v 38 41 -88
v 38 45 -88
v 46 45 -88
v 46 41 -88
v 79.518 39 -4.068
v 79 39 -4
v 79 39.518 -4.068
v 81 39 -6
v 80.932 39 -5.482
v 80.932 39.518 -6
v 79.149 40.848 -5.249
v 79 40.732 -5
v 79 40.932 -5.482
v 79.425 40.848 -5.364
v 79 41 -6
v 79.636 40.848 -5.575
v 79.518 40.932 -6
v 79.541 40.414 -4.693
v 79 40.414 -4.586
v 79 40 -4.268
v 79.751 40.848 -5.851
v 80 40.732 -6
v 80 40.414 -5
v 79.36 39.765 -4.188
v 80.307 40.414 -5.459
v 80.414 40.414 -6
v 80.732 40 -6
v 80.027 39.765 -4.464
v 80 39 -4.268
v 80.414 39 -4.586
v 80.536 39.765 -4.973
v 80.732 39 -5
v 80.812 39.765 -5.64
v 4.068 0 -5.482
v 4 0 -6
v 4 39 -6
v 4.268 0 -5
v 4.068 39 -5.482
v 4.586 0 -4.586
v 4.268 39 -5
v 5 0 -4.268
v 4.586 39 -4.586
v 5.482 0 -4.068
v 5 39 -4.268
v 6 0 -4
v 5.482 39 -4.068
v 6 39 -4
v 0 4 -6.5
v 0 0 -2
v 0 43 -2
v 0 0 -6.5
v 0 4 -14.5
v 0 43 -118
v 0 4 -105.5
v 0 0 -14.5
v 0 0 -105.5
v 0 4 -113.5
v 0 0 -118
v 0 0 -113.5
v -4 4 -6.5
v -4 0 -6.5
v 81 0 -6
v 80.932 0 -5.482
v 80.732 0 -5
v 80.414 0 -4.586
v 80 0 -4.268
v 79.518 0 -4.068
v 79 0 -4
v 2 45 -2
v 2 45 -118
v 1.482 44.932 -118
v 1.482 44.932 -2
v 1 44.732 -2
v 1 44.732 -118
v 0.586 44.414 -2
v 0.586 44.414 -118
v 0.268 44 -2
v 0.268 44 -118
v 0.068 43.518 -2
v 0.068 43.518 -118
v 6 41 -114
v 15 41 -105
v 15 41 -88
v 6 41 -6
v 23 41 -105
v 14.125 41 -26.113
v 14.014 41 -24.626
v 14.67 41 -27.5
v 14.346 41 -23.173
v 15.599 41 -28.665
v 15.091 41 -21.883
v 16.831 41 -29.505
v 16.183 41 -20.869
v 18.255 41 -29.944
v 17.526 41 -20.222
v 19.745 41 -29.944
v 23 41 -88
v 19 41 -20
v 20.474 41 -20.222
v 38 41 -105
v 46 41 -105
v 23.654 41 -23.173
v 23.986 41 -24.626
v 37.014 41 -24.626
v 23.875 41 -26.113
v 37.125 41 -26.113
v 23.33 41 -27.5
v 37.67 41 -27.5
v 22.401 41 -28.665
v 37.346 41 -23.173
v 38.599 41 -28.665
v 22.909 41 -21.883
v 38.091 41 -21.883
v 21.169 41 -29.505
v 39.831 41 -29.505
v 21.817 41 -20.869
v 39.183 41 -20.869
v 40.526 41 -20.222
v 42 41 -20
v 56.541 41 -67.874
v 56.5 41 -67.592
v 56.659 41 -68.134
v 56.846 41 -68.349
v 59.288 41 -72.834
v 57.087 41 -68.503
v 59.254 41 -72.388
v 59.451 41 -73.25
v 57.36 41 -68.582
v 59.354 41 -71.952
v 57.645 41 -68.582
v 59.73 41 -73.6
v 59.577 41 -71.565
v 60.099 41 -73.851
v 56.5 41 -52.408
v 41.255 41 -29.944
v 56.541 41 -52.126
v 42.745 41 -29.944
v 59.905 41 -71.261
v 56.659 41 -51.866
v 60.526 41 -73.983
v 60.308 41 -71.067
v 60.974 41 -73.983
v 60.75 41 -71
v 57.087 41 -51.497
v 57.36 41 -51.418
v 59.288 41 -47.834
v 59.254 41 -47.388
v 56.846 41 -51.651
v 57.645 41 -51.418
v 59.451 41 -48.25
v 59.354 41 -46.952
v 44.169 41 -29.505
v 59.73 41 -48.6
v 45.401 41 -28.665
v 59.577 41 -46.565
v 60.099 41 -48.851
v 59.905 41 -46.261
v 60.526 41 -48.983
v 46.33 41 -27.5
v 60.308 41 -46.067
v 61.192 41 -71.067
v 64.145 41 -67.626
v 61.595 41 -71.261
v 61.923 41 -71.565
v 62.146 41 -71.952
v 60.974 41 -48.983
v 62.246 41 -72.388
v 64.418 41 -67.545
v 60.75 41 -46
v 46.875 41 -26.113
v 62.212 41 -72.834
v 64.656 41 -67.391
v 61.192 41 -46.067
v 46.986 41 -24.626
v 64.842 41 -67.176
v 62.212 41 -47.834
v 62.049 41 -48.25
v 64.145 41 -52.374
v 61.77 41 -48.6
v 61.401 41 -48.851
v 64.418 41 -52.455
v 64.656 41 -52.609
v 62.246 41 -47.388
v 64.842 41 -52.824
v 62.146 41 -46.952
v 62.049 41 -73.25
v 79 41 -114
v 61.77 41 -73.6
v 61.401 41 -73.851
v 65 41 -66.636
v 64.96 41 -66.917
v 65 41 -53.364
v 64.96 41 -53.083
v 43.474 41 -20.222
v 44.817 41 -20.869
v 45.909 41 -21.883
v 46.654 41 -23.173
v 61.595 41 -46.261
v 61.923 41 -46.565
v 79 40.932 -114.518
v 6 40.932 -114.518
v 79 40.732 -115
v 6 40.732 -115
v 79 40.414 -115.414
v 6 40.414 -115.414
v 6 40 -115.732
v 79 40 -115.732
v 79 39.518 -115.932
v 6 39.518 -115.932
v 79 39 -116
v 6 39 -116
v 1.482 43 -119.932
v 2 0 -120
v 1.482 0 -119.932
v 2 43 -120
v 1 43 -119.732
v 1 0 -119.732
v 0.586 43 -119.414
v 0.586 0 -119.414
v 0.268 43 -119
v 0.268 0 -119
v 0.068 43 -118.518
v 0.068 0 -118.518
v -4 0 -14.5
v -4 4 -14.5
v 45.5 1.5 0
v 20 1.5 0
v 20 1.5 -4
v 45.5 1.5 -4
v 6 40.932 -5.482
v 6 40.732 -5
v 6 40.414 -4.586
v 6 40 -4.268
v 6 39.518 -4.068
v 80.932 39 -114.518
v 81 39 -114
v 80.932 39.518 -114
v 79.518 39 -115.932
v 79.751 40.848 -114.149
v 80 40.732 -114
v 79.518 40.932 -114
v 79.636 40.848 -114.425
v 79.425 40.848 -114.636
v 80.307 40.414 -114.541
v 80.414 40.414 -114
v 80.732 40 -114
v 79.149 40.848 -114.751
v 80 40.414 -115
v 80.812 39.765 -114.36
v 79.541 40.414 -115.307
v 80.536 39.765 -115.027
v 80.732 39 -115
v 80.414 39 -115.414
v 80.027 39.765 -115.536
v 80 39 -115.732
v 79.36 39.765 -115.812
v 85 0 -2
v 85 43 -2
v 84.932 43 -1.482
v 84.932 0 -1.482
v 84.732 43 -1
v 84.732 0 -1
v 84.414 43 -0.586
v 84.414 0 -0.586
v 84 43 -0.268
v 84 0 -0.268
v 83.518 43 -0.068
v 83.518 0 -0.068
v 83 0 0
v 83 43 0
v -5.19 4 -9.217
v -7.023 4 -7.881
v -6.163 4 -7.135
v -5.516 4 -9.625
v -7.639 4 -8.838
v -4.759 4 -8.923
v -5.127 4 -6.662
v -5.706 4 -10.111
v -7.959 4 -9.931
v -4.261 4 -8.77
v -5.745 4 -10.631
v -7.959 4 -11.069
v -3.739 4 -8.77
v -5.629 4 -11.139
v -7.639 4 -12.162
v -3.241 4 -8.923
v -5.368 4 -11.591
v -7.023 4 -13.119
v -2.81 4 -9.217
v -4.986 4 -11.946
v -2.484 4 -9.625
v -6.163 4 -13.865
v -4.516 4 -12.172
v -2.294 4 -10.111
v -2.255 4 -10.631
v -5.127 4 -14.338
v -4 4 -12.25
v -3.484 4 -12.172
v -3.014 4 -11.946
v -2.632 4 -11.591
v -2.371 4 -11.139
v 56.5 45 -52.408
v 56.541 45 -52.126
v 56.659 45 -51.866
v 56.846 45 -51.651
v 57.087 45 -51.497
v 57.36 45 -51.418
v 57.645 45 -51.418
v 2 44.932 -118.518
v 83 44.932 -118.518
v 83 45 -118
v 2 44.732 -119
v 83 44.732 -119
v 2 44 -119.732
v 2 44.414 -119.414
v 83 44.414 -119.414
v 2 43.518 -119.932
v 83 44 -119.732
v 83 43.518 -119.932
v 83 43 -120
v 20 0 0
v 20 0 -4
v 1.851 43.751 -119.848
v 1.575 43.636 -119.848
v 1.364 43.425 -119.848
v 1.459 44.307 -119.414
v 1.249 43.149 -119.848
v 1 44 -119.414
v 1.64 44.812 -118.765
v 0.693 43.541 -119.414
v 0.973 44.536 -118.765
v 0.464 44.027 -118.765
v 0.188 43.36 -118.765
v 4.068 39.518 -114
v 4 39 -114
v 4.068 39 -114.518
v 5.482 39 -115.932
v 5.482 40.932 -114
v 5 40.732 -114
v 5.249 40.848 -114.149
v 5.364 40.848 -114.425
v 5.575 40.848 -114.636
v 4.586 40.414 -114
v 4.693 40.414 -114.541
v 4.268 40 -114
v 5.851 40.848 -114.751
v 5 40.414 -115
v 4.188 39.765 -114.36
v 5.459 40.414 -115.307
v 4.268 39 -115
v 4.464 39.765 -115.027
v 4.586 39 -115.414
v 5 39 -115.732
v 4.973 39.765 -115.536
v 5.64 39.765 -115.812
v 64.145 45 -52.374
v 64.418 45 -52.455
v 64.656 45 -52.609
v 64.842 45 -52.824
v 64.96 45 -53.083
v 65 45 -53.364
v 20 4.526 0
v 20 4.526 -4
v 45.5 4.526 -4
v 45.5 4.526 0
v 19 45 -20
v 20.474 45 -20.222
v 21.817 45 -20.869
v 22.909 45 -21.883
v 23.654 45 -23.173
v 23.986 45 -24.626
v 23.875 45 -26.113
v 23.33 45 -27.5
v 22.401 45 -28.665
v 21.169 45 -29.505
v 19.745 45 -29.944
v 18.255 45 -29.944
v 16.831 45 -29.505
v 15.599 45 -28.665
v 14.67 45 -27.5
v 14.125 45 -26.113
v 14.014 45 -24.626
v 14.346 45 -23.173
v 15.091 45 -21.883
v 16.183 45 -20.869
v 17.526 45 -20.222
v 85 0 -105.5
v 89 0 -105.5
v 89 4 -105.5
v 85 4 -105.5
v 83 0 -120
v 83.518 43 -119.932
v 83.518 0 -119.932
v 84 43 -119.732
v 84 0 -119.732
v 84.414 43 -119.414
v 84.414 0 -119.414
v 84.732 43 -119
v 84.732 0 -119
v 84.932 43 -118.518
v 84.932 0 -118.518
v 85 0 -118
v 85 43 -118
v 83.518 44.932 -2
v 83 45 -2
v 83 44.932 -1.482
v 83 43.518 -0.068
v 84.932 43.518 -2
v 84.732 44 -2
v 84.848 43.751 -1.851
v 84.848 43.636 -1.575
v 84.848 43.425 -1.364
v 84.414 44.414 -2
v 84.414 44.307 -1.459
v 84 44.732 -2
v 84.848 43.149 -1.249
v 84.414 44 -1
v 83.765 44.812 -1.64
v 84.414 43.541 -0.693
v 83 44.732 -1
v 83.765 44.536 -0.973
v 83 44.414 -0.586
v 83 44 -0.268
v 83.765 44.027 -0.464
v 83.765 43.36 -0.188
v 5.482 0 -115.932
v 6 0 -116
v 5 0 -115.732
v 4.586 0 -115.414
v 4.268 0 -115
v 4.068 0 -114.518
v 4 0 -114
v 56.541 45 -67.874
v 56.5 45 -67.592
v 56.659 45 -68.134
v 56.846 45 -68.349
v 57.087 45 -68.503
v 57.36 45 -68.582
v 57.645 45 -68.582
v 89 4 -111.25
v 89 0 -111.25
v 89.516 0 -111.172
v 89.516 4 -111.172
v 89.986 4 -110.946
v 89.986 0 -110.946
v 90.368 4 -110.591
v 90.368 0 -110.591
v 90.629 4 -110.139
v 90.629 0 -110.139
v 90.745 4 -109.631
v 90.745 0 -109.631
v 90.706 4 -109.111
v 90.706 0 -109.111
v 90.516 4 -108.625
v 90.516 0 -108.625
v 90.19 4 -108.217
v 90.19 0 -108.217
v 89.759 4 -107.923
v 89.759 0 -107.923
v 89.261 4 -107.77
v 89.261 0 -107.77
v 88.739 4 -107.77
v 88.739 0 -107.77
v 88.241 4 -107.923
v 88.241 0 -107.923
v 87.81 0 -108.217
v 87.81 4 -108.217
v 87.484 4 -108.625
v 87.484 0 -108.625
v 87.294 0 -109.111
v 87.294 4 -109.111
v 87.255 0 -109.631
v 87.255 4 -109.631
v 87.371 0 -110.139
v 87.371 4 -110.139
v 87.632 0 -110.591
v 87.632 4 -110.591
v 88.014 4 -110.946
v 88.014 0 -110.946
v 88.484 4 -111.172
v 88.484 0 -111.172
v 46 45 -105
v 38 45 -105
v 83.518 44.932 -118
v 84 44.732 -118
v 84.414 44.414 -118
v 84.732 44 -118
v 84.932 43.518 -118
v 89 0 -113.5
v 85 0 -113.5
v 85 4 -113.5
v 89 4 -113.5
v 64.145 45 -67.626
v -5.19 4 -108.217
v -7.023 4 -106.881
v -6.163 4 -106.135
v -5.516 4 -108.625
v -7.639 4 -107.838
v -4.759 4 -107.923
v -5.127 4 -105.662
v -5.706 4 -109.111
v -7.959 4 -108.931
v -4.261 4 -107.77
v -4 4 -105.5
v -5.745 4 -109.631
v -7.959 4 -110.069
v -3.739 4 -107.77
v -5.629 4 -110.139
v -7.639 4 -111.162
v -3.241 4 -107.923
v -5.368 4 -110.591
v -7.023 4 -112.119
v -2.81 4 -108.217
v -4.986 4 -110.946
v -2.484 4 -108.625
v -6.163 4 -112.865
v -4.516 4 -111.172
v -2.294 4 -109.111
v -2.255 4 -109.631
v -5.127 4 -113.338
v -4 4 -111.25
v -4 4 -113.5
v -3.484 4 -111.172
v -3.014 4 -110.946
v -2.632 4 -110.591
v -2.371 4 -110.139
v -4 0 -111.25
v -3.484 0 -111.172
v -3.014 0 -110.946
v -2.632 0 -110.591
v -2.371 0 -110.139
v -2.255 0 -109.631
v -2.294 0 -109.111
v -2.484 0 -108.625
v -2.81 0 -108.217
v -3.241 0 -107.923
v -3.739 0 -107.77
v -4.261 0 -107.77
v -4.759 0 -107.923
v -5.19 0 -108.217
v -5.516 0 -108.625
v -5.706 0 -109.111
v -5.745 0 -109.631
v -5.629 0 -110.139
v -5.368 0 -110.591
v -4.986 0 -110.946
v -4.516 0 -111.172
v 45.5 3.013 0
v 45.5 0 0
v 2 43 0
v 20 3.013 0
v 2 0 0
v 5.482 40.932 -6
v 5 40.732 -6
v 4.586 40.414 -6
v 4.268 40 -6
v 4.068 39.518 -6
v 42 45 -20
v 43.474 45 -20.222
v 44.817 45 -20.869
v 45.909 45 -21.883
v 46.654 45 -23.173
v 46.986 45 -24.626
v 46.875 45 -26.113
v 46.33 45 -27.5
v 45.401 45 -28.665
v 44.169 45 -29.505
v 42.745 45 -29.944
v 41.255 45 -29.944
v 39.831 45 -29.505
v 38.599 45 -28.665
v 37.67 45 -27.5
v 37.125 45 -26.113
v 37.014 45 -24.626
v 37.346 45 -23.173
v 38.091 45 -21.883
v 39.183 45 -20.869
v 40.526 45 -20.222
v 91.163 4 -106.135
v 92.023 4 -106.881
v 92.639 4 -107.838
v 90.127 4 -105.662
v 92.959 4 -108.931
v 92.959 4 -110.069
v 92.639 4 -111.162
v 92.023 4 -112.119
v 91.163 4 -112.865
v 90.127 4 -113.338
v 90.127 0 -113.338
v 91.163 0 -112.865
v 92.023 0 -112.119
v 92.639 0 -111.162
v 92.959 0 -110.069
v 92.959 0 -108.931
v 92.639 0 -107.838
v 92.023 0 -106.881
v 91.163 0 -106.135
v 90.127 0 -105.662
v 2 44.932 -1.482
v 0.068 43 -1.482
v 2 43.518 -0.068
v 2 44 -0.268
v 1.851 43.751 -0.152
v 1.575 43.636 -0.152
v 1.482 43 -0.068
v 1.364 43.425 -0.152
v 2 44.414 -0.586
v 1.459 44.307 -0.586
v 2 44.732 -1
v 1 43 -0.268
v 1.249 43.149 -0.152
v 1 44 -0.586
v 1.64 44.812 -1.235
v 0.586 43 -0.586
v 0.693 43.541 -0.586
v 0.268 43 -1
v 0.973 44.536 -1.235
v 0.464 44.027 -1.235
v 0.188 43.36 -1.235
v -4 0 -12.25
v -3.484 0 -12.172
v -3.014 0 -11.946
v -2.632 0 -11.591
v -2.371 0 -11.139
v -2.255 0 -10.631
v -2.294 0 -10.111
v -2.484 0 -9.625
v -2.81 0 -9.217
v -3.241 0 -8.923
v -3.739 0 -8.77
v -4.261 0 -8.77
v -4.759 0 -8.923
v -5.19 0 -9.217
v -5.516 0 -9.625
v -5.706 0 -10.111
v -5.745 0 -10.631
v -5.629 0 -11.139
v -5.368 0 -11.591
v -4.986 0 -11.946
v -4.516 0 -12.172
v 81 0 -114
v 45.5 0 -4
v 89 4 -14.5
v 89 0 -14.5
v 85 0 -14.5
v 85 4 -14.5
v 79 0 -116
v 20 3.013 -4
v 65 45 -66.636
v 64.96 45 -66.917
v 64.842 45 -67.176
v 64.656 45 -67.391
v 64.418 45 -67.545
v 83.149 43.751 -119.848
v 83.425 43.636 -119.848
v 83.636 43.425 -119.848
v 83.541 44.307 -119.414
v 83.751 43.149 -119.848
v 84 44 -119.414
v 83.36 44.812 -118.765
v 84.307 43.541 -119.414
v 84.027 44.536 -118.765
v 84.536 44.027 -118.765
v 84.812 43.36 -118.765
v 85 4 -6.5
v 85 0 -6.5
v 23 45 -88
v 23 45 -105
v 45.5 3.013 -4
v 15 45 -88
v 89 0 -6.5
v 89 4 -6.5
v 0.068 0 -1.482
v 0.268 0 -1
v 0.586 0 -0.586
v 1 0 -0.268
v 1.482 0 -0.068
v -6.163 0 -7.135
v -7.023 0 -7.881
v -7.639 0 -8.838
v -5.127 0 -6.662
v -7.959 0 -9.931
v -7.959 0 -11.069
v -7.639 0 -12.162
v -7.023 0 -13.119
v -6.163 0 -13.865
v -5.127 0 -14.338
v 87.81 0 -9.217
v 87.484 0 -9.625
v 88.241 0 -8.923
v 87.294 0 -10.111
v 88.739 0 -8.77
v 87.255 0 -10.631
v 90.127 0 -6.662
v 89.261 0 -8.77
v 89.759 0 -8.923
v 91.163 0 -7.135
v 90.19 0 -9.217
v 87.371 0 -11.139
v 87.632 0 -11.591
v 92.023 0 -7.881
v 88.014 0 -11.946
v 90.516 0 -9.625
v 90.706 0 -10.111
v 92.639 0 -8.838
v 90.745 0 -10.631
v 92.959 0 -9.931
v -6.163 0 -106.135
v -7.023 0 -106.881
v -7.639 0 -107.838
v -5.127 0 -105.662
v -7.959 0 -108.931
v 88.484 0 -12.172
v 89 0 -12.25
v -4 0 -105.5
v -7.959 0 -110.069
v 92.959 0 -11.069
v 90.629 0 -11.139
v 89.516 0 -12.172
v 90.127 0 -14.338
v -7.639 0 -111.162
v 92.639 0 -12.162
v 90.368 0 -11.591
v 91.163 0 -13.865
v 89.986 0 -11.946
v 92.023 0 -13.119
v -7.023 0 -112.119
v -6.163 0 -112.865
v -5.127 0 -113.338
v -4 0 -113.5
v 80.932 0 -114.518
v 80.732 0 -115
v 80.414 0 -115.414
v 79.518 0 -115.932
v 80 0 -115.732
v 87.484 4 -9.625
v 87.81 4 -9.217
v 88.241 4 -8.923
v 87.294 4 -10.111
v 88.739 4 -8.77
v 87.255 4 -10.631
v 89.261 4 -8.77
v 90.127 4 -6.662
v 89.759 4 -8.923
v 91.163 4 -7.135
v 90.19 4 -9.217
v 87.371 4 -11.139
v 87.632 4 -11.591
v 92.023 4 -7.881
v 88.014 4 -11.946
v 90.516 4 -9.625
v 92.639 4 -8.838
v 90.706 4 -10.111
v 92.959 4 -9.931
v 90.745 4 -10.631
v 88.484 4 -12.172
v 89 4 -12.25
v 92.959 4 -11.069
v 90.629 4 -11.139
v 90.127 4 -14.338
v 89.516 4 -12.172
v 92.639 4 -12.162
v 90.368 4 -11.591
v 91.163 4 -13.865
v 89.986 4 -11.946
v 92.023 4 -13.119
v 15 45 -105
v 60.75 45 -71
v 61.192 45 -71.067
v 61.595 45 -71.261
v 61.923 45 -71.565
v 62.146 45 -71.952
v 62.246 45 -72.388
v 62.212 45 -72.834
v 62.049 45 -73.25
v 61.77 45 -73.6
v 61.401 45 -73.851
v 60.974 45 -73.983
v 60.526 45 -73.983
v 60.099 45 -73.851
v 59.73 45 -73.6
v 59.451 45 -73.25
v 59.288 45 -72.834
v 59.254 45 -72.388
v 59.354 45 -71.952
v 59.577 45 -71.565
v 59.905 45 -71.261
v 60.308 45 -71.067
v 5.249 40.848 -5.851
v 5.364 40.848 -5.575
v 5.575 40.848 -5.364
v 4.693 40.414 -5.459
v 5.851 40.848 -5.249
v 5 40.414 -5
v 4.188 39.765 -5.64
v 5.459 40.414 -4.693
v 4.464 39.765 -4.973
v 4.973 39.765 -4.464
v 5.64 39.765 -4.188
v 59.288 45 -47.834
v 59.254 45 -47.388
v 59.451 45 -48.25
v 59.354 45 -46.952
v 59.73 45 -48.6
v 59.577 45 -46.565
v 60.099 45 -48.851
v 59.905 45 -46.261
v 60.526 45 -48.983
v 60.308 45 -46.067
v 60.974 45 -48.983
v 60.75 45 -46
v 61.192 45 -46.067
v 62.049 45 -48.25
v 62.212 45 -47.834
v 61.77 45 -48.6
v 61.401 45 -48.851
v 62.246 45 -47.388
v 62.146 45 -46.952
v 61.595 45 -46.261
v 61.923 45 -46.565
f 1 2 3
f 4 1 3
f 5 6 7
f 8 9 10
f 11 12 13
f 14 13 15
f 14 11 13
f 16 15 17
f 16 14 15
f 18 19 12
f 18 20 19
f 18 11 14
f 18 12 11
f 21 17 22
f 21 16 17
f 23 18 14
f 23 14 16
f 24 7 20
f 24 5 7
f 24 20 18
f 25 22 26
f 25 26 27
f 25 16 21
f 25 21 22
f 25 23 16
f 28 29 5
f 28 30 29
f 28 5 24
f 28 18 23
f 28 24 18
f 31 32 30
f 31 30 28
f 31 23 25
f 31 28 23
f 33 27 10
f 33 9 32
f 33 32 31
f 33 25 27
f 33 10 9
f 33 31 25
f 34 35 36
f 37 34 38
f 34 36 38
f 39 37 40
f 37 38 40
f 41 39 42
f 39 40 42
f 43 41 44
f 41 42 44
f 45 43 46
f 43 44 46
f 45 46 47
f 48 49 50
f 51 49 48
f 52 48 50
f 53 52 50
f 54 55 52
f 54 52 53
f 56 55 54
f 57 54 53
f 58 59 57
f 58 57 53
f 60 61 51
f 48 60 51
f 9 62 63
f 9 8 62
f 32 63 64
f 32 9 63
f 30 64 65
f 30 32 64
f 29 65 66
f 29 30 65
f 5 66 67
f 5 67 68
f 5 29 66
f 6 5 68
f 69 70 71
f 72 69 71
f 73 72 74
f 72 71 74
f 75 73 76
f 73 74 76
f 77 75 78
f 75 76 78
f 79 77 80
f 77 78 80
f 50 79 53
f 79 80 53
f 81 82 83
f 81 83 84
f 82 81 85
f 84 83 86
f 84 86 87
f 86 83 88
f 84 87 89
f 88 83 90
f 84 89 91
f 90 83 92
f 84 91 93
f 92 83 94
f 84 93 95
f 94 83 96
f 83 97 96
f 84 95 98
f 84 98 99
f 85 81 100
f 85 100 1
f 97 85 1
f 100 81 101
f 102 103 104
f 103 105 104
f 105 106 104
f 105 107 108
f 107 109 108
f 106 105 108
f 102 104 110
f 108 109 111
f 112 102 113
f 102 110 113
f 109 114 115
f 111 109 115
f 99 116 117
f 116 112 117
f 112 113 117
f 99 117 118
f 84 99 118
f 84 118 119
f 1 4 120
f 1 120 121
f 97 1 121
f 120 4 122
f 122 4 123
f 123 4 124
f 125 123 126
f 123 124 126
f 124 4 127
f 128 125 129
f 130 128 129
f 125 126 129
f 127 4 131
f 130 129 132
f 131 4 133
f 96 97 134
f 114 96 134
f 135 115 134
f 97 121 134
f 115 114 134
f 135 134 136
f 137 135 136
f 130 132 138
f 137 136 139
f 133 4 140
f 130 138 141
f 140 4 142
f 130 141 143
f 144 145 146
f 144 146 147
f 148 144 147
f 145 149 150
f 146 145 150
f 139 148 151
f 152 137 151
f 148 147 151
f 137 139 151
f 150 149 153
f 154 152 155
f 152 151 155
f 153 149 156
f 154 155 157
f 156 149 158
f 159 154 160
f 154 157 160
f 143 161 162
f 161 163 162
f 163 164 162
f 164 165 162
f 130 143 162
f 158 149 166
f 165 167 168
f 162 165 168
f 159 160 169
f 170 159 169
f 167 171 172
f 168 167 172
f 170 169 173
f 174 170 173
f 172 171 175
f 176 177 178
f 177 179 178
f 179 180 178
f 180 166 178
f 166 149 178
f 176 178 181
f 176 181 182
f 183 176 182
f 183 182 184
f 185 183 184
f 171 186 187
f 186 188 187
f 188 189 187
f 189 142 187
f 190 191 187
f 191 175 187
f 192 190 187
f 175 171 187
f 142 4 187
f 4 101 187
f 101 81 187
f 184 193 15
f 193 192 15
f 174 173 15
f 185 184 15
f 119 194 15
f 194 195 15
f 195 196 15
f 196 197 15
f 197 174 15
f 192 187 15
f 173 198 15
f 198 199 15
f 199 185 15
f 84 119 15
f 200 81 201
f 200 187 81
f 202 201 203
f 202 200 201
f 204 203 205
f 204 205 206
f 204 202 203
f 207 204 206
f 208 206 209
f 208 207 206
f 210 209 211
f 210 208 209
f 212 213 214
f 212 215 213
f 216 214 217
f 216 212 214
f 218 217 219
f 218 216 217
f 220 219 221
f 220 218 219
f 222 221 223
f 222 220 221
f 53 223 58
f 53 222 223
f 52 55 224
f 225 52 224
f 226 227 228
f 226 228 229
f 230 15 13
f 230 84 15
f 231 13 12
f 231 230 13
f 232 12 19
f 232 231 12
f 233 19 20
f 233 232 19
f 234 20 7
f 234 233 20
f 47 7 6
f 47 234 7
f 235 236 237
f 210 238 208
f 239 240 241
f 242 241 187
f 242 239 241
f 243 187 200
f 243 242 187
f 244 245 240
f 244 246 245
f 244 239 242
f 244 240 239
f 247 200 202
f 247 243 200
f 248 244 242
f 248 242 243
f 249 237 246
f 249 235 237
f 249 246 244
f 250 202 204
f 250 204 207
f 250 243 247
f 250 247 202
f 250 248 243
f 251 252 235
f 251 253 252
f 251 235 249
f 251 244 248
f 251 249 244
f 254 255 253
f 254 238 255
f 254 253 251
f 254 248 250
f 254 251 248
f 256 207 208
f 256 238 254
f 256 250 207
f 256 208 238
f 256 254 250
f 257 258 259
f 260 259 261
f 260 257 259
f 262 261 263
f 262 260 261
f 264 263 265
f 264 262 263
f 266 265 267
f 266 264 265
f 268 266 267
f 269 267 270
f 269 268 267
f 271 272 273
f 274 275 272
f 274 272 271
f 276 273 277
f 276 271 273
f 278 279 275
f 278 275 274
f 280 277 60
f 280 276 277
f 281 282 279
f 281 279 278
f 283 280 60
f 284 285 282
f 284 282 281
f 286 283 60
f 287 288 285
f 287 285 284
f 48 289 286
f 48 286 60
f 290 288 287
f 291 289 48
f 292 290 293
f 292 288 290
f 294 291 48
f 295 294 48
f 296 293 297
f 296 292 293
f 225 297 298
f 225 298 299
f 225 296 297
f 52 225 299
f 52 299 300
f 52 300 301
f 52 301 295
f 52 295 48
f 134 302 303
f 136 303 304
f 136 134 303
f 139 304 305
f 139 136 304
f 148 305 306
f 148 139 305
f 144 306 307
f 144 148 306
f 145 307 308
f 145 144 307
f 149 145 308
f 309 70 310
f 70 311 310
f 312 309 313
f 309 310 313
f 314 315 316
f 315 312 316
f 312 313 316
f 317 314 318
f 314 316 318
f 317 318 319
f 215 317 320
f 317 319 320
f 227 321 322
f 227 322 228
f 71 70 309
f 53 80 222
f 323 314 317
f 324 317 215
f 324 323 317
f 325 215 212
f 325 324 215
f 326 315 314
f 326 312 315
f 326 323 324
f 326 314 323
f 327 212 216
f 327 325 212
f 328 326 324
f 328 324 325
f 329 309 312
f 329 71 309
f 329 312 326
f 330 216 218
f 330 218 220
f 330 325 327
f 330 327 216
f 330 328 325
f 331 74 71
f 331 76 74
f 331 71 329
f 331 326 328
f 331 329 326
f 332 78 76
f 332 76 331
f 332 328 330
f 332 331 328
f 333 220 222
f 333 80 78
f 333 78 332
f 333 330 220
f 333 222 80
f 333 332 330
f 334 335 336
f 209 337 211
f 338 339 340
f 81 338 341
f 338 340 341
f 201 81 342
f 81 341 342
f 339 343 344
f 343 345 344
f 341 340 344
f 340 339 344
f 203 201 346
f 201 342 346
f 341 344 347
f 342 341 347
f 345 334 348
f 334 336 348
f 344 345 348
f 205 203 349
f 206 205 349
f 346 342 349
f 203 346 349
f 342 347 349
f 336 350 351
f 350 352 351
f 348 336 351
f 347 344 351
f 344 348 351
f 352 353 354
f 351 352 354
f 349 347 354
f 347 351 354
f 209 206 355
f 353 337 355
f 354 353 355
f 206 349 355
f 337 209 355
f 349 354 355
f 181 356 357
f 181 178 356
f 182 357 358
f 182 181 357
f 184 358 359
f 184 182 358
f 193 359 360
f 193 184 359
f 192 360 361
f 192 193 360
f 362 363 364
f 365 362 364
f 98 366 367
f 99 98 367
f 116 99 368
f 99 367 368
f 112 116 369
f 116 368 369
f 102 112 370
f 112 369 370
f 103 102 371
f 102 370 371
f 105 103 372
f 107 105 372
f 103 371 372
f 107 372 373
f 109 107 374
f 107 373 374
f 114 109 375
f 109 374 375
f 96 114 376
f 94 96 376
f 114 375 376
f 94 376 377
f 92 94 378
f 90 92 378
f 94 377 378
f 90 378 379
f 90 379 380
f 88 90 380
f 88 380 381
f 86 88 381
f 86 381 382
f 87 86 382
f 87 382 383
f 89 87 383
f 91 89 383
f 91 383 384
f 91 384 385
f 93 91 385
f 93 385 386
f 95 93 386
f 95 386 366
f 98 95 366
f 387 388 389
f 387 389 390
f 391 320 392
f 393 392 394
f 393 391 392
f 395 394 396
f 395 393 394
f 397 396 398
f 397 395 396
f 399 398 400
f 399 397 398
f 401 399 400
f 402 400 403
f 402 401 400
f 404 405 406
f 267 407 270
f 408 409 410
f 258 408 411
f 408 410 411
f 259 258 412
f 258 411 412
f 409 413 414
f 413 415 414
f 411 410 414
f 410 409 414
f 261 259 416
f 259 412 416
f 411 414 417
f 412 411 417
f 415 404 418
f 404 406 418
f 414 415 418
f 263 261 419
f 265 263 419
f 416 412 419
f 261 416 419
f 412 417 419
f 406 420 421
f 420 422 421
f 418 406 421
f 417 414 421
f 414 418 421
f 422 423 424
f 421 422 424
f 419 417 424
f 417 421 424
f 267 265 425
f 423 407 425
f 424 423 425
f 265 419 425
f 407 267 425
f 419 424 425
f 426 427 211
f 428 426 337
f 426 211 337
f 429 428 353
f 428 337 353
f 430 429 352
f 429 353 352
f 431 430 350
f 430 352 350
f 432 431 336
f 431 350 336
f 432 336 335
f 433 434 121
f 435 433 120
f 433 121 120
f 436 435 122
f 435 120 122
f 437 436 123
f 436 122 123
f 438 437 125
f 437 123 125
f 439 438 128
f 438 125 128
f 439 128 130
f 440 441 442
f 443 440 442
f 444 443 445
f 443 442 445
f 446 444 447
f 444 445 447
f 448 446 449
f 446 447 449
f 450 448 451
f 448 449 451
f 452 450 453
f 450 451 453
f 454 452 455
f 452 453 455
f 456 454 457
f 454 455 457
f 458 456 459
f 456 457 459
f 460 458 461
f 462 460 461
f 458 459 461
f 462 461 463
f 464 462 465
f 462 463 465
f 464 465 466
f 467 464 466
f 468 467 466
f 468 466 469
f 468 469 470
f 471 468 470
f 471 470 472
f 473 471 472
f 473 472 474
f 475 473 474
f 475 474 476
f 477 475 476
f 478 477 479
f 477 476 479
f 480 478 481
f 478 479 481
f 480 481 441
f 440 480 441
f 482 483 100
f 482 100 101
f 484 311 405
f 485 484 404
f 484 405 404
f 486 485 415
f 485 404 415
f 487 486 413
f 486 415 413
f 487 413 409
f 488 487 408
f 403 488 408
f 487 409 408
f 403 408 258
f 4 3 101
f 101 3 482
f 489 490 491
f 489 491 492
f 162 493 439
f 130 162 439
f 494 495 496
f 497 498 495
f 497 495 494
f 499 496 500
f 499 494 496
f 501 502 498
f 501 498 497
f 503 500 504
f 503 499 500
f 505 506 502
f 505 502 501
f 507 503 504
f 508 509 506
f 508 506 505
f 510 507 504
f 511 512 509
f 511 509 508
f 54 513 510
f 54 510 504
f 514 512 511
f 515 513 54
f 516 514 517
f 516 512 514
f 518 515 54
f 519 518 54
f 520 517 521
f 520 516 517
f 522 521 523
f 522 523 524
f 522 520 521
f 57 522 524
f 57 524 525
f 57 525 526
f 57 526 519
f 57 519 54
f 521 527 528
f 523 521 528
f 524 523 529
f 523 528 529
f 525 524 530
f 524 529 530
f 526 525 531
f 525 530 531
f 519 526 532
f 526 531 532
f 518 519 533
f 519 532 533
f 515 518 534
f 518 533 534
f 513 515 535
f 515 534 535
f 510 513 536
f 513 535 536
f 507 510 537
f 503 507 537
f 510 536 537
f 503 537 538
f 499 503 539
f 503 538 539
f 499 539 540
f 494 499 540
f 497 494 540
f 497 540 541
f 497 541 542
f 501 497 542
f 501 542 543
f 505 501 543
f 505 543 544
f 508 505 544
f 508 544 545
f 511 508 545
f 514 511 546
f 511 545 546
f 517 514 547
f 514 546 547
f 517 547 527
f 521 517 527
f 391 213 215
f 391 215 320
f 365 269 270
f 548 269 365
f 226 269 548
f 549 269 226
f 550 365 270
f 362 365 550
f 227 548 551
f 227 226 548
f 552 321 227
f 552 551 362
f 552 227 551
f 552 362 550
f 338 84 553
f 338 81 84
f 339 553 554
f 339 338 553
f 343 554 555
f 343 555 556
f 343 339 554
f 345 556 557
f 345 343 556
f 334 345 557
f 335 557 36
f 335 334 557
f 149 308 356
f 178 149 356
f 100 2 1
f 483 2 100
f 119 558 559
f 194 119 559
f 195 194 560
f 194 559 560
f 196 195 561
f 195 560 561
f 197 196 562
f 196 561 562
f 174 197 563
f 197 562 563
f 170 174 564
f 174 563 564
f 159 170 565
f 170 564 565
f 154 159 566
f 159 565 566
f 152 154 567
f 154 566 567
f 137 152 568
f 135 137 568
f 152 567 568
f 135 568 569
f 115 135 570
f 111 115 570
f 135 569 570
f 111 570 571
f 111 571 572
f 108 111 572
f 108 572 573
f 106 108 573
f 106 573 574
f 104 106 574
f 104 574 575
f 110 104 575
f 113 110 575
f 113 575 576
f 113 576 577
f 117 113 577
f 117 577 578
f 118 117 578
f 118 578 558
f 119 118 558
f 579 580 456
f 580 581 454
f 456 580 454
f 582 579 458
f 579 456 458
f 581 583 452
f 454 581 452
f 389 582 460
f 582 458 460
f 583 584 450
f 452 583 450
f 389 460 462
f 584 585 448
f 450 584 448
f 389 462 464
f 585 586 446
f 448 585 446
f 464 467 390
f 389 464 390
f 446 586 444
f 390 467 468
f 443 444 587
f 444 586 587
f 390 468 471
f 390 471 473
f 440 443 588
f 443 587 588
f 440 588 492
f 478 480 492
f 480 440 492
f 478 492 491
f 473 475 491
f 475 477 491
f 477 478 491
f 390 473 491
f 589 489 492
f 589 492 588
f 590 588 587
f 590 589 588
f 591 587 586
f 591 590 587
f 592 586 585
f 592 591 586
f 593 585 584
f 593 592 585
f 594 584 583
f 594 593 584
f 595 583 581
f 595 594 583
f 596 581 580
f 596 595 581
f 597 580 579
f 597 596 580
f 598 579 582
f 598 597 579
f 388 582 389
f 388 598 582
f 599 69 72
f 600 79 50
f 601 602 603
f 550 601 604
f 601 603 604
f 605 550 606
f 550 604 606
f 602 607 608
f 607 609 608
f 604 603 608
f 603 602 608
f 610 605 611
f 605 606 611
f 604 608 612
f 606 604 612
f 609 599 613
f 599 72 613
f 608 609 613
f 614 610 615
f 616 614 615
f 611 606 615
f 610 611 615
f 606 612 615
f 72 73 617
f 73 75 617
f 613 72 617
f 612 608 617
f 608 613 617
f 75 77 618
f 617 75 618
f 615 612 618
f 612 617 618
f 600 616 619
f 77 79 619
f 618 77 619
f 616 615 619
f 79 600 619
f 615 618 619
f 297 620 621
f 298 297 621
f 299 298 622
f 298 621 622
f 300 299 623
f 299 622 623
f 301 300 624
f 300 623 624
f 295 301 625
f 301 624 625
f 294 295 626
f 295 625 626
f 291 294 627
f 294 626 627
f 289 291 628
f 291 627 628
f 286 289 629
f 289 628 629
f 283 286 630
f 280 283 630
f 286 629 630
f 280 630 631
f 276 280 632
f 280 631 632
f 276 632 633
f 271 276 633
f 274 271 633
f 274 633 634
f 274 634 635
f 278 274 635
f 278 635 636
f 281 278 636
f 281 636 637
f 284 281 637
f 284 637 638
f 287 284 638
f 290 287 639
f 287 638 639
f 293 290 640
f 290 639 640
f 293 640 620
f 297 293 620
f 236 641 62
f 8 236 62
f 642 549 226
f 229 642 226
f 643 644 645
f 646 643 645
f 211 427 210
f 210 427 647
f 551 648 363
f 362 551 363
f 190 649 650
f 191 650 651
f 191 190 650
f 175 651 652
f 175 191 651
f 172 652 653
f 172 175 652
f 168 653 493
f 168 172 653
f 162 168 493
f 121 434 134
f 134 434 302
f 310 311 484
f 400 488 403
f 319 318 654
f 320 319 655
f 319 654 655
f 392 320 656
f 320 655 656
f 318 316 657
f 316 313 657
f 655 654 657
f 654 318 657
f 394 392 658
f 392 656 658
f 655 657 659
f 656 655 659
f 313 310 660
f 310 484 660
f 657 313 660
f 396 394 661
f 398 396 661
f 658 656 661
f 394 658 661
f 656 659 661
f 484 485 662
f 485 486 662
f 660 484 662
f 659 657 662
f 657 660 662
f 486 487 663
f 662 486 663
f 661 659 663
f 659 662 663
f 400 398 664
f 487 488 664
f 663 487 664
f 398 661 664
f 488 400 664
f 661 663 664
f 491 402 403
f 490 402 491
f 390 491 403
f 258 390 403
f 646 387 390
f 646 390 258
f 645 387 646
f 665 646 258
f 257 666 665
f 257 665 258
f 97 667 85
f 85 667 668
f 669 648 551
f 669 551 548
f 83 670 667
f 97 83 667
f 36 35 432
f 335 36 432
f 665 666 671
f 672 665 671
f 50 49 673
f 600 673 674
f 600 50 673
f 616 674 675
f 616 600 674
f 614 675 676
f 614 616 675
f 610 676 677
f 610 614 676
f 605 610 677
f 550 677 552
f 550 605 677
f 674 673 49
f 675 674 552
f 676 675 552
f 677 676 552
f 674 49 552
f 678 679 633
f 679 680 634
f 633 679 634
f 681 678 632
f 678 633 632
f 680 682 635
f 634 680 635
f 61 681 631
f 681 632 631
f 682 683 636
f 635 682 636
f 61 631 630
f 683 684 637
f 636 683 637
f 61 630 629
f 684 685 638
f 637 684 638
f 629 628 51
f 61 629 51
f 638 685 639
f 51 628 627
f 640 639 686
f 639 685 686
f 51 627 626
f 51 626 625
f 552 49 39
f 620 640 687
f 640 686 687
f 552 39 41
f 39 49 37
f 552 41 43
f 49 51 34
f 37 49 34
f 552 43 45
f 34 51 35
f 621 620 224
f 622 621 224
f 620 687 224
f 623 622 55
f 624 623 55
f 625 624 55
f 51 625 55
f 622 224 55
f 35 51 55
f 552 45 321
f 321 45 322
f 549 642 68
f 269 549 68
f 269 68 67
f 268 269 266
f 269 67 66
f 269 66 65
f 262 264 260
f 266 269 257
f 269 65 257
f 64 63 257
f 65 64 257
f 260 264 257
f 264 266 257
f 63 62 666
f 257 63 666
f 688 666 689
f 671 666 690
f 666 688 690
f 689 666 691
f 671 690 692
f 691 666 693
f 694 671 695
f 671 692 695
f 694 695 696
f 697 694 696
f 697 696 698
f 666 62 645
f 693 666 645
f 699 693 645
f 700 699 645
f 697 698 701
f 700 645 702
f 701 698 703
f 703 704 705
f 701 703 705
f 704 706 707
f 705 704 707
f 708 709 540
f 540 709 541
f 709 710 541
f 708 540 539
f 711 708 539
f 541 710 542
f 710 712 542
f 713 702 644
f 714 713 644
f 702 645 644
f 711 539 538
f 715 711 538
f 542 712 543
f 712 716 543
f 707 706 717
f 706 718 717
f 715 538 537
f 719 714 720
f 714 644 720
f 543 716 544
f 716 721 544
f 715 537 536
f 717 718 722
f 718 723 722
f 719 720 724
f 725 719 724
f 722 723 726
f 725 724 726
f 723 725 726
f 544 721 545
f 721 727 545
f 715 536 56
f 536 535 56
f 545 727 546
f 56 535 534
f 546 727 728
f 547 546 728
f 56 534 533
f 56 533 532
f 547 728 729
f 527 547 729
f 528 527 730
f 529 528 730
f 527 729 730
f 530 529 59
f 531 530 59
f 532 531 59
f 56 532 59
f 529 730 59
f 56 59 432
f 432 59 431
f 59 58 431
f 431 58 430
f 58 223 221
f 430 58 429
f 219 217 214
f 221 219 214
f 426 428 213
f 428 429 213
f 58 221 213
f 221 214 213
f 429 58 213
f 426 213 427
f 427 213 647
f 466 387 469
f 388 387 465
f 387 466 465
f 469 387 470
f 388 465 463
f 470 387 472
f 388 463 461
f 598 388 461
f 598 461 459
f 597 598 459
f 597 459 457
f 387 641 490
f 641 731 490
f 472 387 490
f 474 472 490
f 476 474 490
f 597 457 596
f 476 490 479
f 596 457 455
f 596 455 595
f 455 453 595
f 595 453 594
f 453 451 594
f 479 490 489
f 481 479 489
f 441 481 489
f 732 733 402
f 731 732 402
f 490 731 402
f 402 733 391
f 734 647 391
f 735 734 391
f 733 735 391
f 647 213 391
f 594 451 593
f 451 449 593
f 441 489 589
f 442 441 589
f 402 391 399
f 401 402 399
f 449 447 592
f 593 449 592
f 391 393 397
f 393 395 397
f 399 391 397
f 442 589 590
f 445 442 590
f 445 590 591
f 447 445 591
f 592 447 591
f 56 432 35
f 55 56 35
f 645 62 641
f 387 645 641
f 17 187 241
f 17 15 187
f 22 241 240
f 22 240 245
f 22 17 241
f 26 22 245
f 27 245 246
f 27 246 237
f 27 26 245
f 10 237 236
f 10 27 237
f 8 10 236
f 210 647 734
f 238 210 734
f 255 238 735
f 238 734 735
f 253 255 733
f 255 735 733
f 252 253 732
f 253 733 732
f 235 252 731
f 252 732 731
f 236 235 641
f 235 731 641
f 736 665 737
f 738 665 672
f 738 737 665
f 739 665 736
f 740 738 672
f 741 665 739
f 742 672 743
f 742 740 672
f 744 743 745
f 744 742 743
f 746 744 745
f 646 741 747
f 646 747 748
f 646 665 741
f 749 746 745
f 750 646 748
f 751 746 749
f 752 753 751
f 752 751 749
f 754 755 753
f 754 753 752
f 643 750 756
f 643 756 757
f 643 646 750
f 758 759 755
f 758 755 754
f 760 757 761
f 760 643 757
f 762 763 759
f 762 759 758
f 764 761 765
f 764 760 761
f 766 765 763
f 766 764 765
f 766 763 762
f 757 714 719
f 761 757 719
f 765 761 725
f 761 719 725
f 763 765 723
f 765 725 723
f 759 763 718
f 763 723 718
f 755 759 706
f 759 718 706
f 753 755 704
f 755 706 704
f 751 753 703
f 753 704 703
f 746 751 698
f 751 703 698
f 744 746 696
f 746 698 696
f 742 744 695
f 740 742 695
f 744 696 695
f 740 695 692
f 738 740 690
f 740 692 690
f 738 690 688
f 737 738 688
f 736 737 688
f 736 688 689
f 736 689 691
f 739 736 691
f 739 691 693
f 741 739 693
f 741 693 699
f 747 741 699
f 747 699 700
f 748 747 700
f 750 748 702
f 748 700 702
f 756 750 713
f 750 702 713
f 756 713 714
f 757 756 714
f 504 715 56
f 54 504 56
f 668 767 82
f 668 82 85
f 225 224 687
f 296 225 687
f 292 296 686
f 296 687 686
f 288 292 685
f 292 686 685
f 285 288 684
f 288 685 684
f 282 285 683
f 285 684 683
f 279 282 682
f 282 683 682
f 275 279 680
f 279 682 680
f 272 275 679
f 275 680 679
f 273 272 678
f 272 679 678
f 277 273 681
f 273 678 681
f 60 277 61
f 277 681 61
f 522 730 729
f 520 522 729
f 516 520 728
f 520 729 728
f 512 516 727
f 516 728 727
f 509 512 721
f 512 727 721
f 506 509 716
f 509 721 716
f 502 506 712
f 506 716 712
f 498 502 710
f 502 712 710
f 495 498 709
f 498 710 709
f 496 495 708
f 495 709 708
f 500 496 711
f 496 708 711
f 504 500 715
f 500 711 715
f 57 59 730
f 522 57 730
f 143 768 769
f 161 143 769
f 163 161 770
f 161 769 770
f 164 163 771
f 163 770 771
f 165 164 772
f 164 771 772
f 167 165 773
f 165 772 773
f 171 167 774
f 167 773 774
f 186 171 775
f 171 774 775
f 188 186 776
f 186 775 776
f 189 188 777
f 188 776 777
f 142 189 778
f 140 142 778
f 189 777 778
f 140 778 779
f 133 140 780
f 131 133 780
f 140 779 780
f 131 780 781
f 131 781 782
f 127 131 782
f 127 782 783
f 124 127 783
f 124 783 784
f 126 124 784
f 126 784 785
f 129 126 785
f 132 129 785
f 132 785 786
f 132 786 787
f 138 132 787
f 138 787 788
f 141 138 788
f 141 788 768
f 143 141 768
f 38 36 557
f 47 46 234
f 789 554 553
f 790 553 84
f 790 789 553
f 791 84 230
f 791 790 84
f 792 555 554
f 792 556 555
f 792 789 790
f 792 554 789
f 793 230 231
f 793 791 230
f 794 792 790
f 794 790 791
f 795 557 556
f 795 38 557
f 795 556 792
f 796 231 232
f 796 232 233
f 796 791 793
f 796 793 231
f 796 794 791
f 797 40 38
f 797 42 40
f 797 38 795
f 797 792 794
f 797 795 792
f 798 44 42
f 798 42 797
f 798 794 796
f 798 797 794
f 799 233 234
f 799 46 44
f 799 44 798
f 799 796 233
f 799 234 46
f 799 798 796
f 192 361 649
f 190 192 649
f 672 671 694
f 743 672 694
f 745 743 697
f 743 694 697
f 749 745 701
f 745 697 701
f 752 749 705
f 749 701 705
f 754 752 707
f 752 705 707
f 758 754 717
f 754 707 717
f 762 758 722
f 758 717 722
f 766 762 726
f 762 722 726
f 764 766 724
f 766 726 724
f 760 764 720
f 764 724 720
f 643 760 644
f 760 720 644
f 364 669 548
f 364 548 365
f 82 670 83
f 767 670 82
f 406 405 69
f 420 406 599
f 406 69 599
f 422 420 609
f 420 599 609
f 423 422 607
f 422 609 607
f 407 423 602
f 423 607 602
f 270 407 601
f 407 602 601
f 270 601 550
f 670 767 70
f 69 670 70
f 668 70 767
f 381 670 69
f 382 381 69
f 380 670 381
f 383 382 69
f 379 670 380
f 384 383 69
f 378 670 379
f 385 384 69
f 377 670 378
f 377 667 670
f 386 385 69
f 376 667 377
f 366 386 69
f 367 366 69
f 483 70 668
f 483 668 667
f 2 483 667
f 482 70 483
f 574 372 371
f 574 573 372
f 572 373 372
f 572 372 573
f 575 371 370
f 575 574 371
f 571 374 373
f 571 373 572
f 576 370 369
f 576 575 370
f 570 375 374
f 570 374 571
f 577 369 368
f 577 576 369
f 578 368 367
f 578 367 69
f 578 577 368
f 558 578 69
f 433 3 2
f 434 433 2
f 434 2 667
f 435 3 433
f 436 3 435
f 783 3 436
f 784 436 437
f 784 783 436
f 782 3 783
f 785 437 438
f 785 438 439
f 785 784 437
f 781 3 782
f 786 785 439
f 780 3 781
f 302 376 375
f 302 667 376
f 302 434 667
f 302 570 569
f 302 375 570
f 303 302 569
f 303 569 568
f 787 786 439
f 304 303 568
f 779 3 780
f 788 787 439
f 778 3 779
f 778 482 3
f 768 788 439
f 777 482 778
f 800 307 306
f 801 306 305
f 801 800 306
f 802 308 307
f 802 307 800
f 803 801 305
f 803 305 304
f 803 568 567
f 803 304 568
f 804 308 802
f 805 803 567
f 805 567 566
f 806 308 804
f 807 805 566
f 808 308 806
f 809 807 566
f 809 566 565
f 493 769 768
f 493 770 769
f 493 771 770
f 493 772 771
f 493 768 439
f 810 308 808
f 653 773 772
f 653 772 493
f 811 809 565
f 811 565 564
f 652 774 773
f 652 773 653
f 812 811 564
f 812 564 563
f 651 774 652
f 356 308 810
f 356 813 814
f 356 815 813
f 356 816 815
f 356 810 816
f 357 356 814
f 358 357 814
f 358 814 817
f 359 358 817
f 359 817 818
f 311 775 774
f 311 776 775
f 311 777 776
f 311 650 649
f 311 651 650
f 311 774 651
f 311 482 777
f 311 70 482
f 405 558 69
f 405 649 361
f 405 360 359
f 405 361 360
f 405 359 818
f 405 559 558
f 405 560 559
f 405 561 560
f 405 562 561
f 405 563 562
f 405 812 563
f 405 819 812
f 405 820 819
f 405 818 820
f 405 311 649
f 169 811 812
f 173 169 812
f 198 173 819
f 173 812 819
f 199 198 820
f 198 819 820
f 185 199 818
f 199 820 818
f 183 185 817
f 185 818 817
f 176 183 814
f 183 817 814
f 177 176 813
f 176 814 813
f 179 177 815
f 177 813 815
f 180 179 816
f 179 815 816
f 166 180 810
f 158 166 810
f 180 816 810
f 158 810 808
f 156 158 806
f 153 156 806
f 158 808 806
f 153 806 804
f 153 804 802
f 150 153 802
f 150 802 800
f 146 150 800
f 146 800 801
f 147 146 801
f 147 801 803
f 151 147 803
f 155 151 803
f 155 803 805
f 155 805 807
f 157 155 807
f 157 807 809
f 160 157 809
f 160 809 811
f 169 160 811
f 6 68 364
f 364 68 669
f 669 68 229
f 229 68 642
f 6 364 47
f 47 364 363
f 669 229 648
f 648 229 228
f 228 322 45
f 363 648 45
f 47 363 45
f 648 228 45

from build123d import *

# Parameters (mm, degrees)
SKETCH1_W               = 85
SKETCH1_H               = 120
BOSS_EXTRUDE1_DEPTH     = 20
SHELL2_T                = -4
SKETCH4_R               = 5
SKETCH4_W               = 8
SKETCH4_H               = 17
CUT_EXTRUDE1_DEPTH      = 20
SKETCH5_W               = 25.5
SKETCH5_H               = 1.5
CUT_EXTRUDE2_DEPTH      = 20
SKETCH6_R               = 1.75
BOSS_EXTRUDE2_DEPTH     = 4
CUT_EXTRUDE3_DEPTH      = 159.347718645
CUT_EXTRUDE3_DEPTH_BACK = 10
SKETCH7_W               = 25.5
SKETCH7_H               = 1.512902769
CUT_EXTRUDE4_START      = 45
SKETCH8_R               = 1.5
CUT_EXTRUDE4_DEPTH      = 10
FILLET1_R               = 1
FILLET2_R               = 2
FILLET3_R               = 2


with BuildPart() as part:
    # Sketch1 → Boss-Extrude1 (new body)
    with BuildSketch(Plane(origin=(0, 0, 0), x_dir=(1, 0, 0), z_dir=(0, 1, 0))):
        with Locations((42.5, 60)):
            Rectangle(SKETCH1_W, SKETCH1_H)
    extrude(amount=BOSS_EXTRUDE1_DEPTH)

    # Sketch2 → section 0 of loft1
    with BuildSketch(Plane(origin=(0, 45, 0), x_dir=(1, 0, 0), z_dir=(0, 1, 0)), mode=Mode.PRIVATE) as loft1_s0:
        with BuildLine():
            Line((0, 120), (85, 120))
            Line((85, 120), (85, 0))
            Line((85, 0), (0, 0))
            Line((0, 0), (0, 120))
        make_face()
    # loft up to a face of the part (loft1)
    loft([loft1_s0.sketch, part.faces().sort_by_distance((42.5, 20, -60))[0]])

    # Shell2
    shell2_openings = [part.faces().sort_by_distance(p)[0] for p in [
        (42.5, 0, -60),
    ]]
    offset(amount=SHELL2_T, openings=shell2_openings, kind=Kind.INTERSECTION)

    # Sketch4 → Cut-Extrude1 (cut)
    with BuildSketch(Plane(origin=(0, 45, 0), x_dir=(1, 0, 0), z_dir=(0, 1, 0))):
        with Locations(Location((19, 25, 0), (0, 0, 270))):
            Circle(SKETCH4_R)
        with Locations(Location((42, 25, 0), (0, 0, 270))):
            Circle(SKETCH4_R)
        with Locations((19, 96.5)):
            Rectangle(SKETCH4_W, SKETCH4_H)
        with Locations((42, 96.5)):
            Rectangle(SKETCH4_W, SKETCH4_H)
    extrude(amount=-CUT_EXTRUDE1_DEPTH, mode=Mode.SUBTRACT)

    # Sketch5 → Cut-Extrude2 (cut)
    with BuildSketch(Plane.XY):
        with Locations((32.75, 0.75)):
            Rectangle(SKETCH5_W, SKETCH5_H)
    extrude(amount=-CUT_EXTRUDE2_DEPTH, mode=Mode.SUBTRACT)

    # Sketch6 → Boss-Extrude2 (add)
    # profile 1 of 4: a face of its own
    with BuildSketch(Plane(origin=(0, 0, 0), x_dir=(-1, 0, 0), z_dir=(0, -1, 0))):
        with BuildLine():
            Line((-85, 6.5), (-89, 6.5))
            ThreePointArc((-89, 6.5), (-93, 10.5), (-89, 14.5))
            Line((-89, 14.5), (-85, 14.5))
            Line((-85, 14.5), (-85, 6.5))
        make_face()
        with Locations(Location((-89, 10.5, 0), (0, 0, 90))):
            Circle(SKETCH6_R, mode=Mode.SUBTRACT)
    # profile 2 of 4: a face of its own
    with BuildSketch(Plane(origin=(0, 0, 0), x_dir=(-1, 0, 0), z_dir=(0, -1, 0))):
        with BuildLine():
            Line((-85, 113.5), (-89, 113.5))
            ThreePointArc((-89, 113.5), (-93, 109.5), (-89, 105.5))
            Line((-89, 105.5), (-85, 105.5))
            Line((-85, 105.5), (-85, 113.5))
        make_face()
        with Locations(Location((-89, 109.5, 0), (0, 0, 90))):
            Circle(SKETCH6_R, mode=Mode.SUBTRACT)
    # profile 3 of 4: a face of its own
    with BuildSketch(Plane(origin=(0, 0, 0), x_dir=(-1, 0, 0), z_dir=(0, -1, 0))):
        with BuildLine():
            Line((0, 113.5), (4, 113.5))
            ThreePointArc((4, 113.5), (8, 109.5), (4, 105.5))
            Line((4, 105.5), (0, 105.5))
            Line((0, 105.5), (0, 113.5))
        make_face()
        with Locations(Location((4, 109.5, 0), (0, 0, 90))):
            Circle(SKETCH6_R, mode=Mode.SUBTRACT)
    # profile 4 of 4: a face of its own
    with BuildSketch(Plane(origin=(0, 0, 0), x_dir=(-1, 0, 0), z_dir=(0, -1, 0))):
        with BuildLine():
            Line((0, 14.5), (4, 14.5))
            ThreePointArc((4, 14.5), (8, 10.5), (4, 6.5))
            Line((4, 6.5), (0, 6.5))
            Line((0, 6.5), (0, 14.5))
        make_face()
        with Locations(Location((4, 10.5, 0), (0, 0, 90))):
            Circle(SKETCH6_R, mode=Mode.SUBTRACT)
    extrude(amount=-BOSS_EXTRUDE2_DEPTH)

    # Sketch7 → Cut-Extrude3 (cut, two sides: drawn at the far end of the back side and taken through both)
    with BuildSketch(Plane.XY.offset(-CUT_EXTRUDE3_DEPTH_BACK)):
        with Locations((32.75, 3.769108467)):
            Rectangle(SKETCH7_W, SKETCH7_H)
    extrude(amount=CUT_EXTRUDE3_DEPTH + CUT_EXTRUDE3_DEPTH_BACK, mode=Mode.SUBTRACT)

    # Sketch8 → Cut-Extrude4 (cut)
    with BuildSketch(Plane(origin=(0, 0, 0), x_dir=(1, 0, 0), z_dir=(0, 1, 0)).offset(CUT_EXTRUDE4_START)):
        with Locations(Location((60.75, 72.5, 0), (0, 0, 270))):
            Circle(SKETCH8_R)
        with Locations(Location((60.75, 47.5, 0), (0, 0, 270))):
            Circle(SKETCH8_R)
        Polygon((56.5, 68.75), (56.5, 51.25), (65, 52.5), (65, 67.5), align=None)
    extrude(amount=-CUT_EXTRUDE4_DEPTH, mode=Mode.SUBTRACT)

    # Fillet1
    fillet1_edges = [part.edges().sort_by_distance(p)[0] for p in [
        (56.5, 43, -51.25),
        (56.5, 43, -68.75),
        (65, 43, -67.5),
        (65, 43, -52.5),
    ]]
    fillet(fillet1_edges, radius=FILLET1_R)

    # Fillet2
    fillet2_edges = [part.edges().sort_by_distance(p)[0] for p in [
        (4, 20.5, -116),
        (4, 20.5, -4),
        (81, 20.5, -4),
        (81, 20.5, -116),
        (4, 41, -60),
        (42.5, 41, -4),
        (81, 41, -60),
        (42.5, 41, -116),
    ]]
    fillet(fillet2_edges, radius=FILLET2_R)

    # Fillet3
    fillet3_edges = [part.edges().sort_by_distance(p)[0] for p in [
        (0, 45, -60),
        (42.5, 45, 0),
        (85, 45, -60),
        (42.5, 45, -120),
        (0, 22.5, -120),
        (85, 22.5, -120),
        (85, 22.5, 0),
        (0, 22.5, 0),
    ]]
    fillet(fillet3_edges, radius=FILLET3_R)


solid = part.part
